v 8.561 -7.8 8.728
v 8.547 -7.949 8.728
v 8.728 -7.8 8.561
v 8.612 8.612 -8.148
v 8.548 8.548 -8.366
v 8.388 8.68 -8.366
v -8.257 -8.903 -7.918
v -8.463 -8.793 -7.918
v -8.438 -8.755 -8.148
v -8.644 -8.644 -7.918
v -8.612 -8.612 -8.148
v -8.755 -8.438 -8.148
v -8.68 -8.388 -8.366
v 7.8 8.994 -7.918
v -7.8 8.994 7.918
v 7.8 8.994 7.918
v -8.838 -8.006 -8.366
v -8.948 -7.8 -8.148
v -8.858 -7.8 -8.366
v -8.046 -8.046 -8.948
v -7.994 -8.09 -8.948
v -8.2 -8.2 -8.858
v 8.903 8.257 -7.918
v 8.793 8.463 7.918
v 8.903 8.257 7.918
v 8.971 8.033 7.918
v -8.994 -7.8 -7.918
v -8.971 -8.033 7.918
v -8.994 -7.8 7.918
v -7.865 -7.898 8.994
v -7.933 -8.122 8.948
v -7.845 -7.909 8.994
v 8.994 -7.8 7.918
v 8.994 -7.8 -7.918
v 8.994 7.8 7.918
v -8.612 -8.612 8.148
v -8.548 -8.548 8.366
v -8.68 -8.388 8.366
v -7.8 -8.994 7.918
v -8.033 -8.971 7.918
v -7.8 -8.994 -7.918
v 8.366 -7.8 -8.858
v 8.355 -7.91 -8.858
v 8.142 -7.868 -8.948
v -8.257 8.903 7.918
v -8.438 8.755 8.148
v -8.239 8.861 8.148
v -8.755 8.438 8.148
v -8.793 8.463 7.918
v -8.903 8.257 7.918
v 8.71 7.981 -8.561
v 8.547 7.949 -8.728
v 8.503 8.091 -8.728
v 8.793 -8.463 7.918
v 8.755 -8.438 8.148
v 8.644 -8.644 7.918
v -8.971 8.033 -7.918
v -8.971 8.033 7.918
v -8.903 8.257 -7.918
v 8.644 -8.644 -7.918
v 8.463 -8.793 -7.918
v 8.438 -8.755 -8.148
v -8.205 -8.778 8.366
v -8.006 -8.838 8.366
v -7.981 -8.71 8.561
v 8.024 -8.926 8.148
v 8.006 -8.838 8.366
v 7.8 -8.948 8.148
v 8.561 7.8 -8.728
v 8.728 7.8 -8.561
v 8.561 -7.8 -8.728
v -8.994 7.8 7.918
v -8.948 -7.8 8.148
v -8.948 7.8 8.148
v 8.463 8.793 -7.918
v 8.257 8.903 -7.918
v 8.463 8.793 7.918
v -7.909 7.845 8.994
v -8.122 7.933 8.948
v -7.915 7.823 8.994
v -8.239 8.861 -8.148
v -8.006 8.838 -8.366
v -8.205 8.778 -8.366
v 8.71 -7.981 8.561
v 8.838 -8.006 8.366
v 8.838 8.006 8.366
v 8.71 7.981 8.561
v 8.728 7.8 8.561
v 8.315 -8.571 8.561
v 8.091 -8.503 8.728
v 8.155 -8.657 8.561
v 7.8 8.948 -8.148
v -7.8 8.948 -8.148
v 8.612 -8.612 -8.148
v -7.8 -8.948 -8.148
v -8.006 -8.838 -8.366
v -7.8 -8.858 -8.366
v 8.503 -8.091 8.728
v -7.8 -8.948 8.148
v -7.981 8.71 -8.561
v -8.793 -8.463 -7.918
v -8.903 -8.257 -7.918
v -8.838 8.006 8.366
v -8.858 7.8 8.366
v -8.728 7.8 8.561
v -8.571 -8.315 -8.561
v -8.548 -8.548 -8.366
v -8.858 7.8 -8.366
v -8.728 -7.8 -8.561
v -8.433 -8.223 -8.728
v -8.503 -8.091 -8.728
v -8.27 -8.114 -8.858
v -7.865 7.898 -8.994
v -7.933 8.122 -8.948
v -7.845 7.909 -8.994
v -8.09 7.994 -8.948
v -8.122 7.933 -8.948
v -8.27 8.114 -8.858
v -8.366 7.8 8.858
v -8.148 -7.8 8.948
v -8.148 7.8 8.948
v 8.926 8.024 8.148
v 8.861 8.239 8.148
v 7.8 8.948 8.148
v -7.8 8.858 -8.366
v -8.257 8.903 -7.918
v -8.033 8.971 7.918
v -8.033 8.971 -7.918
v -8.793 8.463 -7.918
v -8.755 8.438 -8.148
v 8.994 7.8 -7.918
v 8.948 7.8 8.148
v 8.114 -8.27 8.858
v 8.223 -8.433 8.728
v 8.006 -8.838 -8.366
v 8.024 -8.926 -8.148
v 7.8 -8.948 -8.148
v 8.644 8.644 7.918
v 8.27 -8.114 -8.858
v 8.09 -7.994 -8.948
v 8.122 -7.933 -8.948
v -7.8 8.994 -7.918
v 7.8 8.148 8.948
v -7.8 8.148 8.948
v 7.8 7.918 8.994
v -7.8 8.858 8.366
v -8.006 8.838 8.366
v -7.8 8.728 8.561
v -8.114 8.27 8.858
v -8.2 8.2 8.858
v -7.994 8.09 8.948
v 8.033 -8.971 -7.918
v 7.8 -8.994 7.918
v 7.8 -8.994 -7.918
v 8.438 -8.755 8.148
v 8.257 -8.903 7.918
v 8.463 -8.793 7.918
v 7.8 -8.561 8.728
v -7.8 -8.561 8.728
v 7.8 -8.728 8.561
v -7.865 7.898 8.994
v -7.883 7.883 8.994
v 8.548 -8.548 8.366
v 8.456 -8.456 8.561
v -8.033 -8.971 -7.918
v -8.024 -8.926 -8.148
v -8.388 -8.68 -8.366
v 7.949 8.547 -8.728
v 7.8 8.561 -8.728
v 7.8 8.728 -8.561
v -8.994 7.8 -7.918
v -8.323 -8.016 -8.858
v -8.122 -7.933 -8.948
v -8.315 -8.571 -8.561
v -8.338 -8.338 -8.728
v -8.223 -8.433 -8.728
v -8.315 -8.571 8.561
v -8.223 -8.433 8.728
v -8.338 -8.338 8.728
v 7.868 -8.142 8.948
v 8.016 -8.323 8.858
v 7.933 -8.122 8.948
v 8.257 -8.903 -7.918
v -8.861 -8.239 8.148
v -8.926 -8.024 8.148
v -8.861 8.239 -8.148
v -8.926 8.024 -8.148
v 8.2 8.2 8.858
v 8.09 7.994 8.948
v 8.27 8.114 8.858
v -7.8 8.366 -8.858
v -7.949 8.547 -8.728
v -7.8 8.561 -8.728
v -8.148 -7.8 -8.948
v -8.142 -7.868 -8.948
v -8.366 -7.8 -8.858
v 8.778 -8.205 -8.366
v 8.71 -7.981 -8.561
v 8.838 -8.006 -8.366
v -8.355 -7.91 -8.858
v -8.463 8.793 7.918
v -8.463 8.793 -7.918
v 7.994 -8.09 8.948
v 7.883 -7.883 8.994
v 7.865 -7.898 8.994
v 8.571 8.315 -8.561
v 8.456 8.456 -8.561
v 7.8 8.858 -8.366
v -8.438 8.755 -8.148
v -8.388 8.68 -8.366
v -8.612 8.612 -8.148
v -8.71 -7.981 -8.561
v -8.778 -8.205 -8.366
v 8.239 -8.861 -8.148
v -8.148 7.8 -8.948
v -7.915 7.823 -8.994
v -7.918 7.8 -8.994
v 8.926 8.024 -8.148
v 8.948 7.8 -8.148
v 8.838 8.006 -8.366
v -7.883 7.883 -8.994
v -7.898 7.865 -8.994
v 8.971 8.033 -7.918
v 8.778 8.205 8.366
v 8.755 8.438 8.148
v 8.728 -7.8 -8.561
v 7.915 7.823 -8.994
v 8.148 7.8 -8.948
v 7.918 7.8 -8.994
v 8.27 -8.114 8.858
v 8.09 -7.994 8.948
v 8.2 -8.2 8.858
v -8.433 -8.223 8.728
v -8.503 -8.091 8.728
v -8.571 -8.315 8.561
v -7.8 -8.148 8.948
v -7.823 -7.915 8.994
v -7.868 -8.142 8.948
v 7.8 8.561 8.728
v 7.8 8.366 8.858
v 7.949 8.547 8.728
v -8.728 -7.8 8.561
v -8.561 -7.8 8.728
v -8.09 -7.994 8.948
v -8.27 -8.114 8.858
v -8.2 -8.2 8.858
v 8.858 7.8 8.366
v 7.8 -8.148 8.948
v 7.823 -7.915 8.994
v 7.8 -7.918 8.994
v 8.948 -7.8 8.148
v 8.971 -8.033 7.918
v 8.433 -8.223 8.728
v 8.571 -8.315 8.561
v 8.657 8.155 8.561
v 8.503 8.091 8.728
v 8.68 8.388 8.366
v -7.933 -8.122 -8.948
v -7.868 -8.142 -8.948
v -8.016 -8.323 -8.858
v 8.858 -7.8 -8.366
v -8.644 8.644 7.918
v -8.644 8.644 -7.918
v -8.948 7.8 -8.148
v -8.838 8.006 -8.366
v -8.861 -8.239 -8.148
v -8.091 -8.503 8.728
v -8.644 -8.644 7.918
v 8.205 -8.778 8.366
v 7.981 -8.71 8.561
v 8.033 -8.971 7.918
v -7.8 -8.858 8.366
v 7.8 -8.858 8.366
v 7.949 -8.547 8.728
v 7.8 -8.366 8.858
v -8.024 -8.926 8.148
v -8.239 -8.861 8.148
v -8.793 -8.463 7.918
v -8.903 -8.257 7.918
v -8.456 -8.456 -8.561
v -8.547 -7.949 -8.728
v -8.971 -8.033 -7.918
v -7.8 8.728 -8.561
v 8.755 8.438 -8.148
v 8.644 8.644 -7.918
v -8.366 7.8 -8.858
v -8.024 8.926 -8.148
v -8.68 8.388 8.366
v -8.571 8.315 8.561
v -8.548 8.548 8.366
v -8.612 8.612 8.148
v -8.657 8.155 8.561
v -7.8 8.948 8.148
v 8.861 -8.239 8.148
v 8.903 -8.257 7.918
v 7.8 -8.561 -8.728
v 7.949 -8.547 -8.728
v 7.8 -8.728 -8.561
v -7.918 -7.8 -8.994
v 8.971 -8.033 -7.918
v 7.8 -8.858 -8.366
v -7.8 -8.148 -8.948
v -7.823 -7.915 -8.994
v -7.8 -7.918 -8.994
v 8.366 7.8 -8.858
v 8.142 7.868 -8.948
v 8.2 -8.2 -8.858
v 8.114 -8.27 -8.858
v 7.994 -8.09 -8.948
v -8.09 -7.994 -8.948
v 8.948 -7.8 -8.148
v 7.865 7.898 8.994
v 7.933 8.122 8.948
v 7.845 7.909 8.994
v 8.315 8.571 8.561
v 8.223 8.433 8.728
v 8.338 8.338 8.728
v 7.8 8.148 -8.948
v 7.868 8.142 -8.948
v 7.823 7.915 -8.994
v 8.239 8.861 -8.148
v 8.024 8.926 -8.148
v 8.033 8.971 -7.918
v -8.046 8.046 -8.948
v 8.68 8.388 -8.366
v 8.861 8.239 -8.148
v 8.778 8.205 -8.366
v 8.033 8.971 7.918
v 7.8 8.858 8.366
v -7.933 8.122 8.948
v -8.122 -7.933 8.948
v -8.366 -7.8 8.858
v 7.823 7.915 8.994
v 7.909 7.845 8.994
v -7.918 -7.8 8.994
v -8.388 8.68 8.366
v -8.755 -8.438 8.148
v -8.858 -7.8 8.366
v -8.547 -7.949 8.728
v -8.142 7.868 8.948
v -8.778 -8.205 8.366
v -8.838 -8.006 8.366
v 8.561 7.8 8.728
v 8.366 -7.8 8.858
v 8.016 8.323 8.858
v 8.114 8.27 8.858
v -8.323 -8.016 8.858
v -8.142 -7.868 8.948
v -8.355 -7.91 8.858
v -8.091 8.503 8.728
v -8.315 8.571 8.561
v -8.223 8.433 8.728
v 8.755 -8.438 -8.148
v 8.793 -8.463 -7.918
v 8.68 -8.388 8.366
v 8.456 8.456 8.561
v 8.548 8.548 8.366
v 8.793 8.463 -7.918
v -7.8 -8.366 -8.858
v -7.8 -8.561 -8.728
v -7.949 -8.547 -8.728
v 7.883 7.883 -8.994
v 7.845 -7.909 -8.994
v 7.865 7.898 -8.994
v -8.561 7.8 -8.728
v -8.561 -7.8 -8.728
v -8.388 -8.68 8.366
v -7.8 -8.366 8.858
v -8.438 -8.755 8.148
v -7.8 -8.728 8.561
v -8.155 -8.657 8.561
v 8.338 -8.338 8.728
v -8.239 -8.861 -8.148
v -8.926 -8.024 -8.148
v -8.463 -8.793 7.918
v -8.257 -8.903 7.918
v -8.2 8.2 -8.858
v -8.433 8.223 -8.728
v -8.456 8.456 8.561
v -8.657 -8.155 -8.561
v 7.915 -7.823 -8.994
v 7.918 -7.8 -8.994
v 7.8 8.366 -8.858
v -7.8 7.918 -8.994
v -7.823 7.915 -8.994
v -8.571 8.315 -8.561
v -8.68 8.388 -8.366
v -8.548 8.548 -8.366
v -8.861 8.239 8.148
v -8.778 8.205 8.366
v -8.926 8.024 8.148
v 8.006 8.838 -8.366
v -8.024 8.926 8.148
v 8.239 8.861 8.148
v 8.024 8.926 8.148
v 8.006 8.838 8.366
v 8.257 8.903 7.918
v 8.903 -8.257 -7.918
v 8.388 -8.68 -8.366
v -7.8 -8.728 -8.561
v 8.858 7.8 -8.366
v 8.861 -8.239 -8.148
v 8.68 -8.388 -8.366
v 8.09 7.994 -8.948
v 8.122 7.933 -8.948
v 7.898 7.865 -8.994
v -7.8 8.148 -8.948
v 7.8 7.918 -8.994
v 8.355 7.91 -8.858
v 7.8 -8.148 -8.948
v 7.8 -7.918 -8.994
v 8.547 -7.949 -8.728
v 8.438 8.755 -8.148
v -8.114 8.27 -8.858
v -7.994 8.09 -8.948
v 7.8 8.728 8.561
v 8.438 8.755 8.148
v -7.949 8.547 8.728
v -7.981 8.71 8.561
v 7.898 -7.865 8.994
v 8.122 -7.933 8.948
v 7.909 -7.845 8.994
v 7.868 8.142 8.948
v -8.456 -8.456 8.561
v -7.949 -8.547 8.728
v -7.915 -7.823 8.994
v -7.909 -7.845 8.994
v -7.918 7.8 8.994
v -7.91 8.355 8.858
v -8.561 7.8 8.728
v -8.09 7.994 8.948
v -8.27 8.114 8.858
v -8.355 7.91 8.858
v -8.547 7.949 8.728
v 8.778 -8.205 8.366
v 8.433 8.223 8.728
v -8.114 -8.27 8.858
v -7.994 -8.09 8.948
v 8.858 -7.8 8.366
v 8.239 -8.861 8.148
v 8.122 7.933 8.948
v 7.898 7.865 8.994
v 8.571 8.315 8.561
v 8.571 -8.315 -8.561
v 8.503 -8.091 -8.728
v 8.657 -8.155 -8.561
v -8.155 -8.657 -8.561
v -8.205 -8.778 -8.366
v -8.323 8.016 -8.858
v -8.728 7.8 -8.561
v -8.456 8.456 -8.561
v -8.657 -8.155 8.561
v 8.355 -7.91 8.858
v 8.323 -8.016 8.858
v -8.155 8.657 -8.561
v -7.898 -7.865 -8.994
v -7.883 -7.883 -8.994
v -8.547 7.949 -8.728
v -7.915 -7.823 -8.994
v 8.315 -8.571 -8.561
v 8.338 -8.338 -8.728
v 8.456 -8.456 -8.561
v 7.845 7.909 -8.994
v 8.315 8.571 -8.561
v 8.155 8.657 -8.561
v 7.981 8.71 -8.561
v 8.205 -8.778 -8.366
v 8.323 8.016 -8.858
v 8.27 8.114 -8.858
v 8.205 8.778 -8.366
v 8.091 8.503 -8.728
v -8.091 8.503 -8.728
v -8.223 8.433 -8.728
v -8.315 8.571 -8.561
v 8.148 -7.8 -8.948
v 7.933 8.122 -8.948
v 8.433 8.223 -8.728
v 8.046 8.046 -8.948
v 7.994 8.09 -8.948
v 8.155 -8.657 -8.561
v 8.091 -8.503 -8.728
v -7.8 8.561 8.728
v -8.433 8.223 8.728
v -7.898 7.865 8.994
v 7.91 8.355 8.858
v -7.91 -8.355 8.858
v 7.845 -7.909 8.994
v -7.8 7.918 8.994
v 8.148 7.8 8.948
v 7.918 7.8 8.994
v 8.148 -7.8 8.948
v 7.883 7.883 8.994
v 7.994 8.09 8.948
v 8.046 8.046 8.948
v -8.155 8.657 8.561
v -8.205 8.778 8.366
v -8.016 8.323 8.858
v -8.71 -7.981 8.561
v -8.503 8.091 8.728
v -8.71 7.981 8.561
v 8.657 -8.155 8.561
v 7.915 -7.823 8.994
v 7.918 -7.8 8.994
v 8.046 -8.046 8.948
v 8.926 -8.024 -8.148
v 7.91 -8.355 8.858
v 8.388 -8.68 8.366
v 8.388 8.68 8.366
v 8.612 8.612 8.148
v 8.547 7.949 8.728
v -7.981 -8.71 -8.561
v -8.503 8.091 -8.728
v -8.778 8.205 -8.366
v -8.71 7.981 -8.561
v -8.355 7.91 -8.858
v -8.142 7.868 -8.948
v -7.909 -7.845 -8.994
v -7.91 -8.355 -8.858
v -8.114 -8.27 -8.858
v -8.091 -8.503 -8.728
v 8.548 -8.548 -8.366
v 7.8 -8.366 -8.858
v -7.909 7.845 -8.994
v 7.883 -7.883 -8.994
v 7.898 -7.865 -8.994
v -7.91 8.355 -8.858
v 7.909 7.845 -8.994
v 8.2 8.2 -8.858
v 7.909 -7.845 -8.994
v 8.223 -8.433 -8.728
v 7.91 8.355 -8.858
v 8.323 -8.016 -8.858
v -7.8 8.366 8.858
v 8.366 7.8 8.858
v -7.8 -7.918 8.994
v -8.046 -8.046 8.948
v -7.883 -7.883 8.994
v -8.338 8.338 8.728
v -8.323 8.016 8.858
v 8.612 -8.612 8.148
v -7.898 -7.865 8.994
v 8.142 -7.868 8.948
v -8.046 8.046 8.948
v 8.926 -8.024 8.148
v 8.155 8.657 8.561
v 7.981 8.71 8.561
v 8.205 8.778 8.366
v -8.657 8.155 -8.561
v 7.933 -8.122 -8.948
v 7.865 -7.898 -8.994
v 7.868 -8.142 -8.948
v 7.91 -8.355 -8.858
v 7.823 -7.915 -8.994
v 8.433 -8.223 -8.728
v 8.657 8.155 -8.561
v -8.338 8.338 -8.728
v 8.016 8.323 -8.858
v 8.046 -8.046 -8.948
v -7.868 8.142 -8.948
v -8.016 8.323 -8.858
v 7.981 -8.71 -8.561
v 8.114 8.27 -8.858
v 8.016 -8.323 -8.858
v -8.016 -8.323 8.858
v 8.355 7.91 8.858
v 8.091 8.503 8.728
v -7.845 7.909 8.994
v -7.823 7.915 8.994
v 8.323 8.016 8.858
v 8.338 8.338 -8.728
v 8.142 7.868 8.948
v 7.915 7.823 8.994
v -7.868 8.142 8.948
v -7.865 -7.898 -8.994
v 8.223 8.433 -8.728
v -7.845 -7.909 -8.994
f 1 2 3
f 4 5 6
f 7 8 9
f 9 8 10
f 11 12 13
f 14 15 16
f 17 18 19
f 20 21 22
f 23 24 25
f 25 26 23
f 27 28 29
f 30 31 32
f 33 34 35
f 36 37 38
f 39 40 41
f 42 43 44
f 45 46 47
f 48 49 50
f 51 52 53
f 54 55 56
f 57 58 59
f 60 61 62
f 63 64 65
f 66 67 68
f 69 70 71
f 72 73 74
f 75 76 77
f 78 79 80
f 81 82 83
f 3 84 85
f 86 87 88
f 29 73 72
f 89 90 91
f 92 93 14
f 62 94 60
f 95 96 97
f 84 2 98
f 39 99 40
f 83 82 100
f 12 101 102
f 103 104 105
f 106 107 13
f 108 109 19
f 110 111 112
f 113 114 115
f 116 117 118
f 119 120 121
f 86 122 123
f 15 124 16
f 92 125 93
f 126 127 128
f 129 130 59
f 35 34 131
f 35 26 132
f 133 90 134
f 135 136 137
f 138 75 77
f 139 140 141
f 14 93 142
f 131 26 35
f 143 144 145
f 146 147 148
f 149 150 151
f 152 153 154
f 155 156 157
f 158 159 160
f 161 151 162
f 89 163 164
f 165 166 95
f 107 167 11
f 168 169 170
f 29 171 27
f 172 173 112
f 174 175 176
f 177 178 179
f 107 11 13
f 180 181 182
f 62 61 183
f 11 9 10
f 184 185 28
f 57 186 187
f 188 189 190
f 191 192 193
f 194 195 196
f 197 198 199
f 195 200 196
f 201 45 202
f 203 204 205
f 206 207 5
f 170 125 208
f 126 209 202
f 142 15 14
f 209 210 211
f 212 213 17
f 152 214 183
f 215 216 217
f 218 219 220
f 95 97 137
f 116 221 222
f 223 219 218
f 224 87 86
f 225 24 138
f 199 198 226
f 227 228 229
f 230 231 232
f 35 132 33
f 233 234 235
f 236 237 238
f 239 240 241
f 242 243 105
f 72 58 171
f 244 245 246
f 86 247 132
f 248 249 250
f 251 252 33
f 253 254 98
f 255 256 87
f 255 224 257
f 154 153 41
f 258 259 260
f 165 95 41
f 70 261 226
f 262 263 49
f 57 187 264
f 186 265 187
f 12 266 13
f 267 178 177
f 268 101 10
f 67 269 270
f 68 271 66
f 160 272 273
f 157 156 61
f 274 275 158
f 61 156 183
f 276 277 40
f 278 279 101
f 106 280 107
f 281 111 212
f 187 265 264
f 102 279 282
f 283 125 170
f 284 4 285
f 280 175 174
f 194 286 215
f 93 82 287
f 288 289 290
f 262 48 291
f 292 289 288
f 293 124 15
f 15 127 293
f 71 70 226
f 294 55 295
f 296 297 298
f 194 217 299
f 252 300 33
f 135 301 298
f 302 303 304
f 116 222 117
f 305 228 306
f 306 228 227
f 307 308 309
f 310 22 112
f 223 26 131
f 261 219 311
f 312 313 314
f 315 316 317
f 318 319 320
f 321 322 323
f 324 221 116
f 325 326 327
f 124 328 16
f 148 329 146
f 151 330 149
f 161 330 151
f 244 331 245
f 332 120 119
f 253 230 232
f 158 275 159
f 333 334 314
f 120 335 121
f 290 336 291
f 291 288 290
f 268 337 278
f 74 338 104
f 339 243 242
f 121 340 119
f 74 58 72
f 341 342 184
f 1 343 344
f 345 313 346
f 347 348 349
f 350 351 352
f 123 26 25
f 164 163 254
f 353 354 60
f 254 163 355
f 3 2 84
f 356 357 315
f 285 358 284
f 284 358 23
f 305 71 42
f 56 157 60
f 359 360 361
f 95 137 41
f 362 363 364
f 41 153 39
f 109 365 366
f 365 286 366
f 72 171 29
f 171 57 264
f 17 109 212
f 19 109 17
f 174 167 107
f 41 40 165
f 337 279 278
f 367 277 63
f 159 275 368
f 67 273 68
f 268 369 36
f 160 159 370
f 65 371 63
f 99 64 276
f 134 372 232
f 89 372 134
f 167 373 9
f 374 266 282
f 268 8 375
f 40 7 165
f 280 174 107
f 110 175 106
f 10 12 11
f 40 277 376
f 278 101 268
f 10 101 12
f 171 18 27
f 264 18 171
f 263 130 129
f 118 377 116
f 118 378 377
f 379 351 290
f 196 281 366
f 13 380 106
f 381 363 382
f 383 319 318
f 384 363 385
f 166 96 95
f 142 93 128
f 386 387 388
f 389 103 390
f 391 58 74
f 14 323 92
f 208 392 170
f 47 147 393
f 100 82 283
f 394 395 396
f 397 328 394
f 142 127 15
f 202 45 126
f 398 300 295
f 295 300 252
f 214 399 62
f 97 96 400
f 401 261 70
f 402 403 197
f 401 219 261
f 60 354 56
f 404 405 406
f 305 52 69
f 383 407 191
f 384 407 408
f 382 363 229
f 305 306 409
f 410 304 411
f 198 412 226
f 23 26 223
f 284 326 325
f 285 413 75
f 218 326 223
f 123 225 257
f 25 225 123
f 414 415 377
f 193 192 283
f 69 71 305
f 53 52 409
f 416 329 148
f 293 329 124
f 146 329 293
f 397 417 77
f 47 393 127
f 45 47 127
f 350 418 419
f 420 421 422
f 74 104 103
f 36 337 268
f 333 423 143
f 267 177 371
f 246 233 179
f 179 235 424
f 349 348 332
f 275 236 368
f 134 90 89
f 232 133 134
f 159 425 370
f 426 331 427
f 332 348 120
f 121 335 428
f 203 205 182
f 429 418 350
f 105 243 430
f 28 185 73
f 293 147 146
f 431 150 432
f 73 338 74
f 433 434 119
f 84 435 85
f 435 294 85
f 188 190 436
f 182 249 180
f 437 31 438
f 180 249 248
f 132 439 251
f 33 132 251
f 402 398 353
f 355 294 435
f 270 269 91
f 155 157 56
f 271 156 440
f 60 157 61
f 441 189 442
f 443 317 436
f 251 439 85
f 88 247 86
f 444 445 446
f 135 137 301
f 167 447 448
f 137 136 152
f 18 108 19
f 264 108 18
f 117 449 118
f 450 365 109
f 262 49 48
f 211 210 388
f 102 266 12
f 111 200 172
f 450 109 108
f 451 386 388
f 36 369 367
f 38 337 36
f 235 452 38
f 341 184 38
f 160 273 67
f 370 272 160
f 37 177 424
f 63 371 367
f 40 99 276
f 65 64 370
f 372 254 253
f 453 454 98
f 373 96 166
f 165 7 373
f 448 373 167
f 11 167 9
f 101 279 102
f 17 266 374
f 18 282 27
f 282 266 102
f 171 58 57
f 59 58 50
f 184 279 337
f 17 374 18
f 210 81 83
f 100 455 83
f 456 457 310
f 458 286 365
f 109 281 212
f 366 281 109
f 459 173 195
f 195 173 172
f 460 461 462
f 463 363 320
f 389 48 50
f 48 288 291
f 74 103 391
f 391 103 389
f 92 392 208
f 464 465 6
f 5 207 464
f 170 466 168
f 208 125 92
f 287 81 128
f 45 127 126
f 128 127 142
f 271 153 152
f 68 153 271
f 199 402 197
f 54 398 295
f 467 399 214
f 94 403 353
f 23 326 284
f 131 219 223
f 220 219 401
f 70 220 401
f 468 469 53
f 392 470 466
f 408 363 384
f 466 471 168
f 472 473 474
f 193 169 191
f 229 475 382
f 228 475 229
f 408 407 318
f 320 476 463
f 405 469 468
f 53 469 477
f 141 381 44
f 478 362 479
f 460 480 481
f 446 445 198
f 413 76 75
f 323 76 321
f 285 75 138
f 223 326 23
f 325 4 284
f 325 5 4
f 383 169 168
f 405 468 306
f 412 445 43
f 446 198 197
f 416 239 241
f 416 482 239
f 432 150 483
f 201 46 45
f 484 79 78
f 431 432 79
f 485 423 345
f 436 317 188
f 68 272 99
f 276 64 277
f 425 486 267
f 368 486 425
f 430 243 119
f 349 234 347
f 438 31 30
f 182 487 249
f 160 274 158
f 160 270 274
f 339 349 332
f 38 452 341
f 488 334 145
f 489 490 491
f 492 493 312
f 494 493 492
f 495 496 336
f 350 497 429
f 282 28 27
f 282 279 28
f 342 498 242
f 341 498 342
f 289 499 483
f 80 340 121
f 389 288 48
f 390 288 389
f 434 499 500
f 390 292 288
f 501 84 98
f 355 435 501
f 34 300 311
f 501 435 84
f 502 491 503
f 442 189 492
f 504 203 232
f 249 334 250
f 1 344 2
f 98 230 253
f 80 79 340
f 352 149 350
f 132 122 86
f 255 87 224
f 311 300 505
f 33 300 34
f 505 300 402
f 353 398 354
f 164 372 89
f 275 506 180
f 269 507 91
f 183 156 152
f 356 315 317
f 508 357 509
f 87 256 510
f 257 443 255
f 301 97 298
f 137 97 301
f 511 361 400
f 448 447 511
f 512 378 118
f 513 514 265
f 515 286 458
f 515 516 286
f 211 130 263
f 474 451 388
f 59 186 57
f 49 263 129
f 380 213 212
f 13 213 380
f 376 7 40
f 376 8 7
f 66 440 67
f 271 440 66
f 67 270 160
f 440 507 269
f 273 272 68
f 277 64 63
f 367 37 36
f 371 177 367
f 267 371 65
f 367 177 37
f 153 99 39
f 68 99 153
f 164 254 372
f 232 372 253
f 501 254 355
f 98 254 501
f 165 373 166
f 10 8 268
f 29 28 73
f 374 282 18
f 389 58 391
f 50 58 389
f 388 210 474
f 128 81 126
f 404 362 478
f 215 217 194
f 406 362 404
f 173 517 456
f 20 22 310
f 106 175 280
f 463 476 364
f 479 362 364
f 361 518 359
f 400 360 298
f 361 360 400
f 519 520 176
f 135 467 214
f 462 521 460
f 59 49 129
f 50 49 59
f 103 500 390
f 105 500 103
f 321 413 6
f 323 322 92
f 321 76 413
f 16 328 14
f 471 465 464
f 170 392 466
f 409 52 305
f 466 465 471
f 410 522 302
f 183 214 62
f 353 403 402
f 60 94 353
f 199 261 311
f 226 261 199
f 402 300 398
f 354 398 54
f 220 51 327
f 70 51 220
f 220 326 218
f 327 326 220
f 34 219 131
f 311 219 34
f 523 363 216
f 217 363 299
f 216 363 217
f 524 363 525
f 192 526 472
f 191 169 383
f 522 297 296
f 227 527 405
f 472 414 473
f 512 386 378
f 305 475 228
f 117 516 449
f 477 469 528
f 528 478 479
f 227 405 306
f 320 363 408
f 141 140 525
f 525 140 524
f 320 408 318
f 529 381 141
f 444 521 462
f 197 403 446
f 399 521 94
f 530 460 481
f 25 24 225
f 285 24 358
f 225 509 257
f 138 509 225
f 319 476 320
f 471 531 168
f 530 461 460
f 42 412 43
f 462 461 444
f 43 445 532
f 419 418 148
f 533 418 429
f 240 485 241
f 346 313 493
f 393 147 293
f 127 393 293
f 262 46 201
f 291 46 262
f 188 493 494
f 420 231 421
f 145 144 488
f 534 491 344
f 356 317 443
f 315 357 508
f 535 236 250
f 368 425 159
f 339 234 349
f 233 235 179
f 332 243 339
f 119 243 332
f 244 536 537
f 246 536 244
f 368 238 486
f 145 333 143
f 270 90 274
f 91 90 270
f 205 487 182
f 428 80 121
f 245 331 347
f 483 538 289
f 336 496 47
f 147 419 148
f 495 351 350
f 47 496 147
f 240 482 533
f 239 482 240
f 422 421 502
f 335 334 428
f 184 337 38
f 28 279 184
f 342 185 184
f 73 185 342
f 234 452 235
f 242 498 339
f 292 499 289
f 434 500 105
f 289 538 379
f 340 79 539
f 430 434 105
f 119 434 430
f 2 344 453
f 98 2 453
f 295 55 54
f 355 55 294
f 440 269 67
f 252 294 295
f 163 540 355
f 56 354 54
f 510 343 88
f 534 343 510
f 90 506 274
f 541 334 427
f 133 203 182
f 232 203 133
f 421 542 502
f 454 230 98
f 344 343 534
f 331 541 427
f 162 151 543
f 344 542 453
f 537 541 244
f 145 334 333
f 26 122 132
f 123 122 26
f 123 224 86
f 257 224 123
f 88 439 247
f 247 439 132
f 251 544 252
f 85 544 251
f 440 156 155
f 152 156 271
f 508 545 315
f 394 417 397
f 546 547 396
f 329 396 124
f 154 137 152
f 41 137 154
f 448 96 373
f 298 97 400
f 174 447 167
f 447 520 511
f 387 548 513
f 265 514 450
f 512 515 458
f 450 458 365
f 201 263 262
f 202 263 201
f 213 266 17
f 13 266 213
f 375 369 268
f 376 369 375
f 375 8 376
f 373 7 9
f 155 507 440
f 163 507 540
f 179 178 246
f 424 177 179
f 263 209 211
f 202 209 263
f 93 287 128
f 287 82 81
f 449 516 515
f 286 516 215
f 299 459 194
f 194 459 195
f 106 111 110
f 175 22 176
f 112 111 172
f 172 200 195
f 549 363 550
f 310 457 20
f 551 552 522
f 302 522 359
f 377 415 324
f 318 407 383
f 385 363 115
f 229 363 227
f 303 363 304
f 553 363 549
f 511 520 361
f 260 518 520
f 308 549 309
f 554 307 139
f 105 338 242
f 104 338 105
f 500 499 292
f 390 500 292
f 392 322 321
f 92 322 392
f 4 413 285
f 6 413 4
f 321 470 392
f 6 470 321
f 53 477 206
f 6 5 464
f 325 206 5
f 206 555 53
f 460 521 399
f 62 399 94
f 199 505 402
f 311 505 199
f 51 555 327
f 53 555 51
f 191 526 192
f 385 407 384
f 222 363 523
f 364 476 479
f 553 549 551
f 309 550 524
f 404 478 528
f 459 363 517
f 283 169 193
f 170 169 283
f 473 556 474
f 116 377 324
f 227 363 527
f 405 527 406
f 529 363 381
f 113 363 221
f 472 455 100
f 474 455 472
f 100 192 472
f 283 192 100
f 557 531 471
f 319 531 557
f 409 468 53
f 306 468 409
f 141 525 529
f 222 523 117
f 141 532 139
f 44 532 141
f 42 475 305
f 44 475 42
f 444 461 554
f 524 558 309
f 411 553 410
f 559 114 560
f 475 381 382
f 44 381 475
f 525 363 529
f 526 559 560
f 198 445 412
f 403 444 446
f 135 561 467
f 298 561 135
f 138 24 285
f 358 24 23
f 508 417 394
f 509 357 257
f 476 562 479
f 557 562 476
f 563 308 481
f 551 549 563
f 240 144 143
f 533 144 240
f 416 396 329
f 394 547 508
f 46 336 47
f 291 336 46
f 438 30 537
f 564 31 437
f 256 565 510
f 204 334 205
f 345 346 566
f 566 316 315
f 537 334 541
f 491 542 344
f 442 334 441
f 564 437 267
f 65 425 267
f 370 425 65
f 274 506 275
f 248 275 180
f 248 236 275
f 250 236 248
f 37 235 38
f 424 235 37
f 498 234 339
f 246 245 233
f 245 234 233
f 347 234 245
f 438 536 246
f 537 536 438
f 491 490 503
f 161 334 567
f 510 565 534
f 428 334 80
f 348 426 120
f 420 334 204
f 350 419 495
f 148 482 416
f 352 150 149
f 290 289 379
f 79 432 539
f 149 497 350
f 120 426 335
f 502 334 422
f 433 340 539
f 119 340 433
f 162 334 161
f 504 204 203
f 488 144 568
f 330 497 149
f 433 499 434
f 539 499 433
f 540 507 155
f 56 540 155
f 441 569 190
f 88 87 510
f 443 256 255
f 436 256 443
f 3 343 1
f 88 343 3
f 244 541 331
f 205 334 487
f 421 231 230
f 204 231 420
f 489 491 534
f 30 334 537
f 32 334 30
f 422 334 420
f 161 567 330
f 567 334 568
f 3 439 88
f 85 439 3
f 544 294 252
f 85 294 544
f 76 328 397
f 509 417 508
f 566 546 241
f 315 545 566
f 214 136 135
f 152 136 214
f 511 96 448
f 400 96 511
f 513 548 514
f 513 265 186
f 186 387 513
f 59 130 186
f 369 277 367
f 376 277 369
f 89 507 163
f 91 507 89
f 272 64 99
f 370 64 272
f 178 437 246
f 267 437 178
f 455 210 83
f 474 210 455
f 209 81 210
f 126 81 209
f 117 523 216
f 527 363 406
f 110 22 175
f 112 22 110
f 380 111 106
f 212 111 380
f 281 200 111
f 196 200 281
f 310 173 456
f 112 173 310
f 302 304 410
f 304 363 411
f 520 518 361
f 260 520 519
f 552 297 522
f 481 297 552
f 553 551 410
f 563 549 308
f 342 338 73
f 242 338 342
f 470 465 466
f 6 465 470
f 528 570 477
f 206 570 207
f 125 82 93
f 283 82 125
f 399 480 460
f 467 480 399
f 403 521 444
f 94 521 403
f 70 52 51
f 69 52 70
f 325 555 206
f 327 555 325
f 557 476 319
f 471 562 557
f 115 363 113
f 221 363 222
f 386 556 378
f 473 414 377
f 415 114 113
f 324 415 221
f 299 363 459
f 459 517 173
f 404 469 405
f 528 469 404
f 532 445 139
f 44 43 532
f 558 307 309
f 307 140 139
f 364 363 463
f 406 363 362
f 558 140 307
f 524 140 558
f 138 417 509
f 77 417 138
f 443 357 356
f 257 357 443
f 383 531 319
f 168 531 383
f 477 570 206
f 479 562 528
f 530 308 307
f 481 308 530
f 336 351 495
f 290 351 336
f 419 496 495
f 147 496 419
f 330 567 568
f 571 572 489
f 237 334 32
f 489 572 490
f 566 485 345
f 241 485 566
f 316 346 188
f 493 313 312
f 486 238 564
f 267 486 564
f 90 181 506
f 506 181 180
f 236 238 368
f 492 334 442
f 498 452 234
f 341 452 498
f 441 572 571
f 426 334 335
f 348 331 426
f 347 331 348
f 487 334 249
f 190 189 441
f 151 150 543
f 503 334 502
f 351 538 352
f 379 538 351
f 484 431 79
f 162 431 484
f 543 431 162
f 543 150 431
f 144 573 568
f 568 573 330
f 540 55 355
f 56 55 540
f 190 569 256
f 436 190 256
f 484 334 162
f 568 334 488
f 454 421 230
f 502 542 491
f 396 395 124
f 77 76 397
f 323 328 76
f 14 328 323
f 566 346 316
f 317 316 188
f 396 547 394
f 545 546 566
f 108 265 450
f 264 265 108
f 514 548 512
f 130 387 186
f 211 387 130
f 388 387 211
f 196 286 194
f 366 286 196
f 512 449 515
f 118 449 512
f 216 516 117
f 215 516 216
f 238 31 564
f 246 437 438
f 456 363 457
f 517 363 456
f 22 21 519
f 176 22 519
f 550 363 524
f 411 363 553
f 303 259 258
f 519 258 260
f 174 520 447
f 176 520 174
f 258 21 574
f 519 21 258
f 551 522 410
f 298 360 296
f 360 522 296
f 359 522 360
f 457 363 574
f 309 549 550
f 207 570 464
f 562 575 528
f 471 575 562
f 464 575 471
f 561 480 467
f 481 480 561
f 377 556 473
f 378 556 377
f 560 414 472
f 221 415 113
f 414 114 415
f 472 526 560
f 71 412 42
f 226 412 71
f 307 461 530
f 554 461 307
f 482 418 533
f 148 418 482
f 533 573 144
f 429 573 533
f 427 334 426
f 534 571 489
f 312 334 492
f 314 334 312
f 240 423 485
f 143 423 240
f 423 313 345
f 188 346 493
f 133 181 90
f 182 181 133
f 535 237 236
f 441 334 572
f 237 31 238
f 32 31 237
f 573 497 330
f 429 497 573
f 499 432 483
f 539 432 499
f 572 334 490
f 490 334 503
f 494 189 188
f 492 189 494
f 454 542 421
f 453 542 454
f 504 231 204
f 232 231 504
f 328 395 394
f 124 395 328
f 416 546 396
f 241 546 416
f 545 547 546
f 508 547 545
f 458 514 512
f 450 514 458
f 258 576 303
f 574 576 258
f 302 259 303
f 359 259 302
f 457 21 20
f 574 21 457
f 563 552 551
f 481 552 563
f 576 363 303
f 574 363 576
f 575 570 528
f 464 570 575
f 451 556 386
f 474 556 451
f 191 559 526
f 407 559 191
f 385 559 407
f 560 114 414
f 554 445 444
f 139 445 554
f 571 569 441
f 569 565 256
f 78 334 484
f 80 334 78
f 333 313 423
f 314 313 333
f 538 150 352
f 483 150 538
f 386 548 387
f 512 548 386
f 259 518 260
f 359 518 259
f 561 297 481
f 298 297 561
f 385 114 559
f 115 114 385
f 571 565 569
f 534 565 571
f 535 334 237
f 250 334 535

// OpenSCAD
// Blank base shapes for the story-dice family. Rounded convex polyhedra.
mode="one"; shape="d6"; size=18; round_r=1.2; $fn=32;
phi=(1+sqrt(5))/2;
c10=0.1056;   // ring height for a TRUE pentagonal trapezohedron (apex = 9.4721*c)
function pts(s) =
  s=="d4"  ? [[1,1,1],[1,-1,-1],[-1,1,-1],[-1,-1,1]] :
  s=="d6"  ? [for(x=[-1,1],y=[-1,1],z=[-1,1]) [x,y,z]] :
  s=="d8"  ? [[1,0,0],[-1,0,0],[0,1,0],[0,-1,0],[0,0,1],[0,0,-1]] :
  s=="d10" ? concat([[0,0,1],[0,0,-1]],
               [for(i=[0:4]) [cos(72*i),      sin(72*i),       c10]],
               [for(i=[0:4]) [cos(72*i+36),   sin(72*i+36),   -c10]]) :
  s=="d12" ? concat([for(x=[-1,1],y=[-1,1],z=[-1,1]) [x,y,z]],
               [for(y=[-1,1],z=[-1,1]) [0, y/phi, z*phi]],
               [for(x=[-1,1],y=[-1,1]) [x/phi, y*phi, 0]],
               [for(x=[-1,1],z=[-1,1]) [x*phi, 0, z/phi]]) :
  s=="d20" ? concat([for(y=[-1,1],z=[-1,1]) [0, y, z*phi]],
               [for(x=[-1,1],y=[-1,1]) [x, y*phi, 0]],
               [for(x=[-1,1],z=[-1,1]) [x*phi, 0, z]]) : [];
module die(s, sz, rr){
  p = pts(s);
  mx = max([for(q=p) max(abs(q[0]),abs(q[1]),abs(q[2]))]);
  k  = (sz/2 - rr)/mx;
  hull() for(q=p) translate(q*k) sphere(r=rr);
}
NM=["d4","d6","d8","d10","d12","d20"]; SZ=[22,18,24,22,24,32];
if(mode=="family") for(i=[0:5]) translate([i*34-85,0,0]) die(NM[i], SZ[i], 1.2);
else die(shape, size, round_r);
